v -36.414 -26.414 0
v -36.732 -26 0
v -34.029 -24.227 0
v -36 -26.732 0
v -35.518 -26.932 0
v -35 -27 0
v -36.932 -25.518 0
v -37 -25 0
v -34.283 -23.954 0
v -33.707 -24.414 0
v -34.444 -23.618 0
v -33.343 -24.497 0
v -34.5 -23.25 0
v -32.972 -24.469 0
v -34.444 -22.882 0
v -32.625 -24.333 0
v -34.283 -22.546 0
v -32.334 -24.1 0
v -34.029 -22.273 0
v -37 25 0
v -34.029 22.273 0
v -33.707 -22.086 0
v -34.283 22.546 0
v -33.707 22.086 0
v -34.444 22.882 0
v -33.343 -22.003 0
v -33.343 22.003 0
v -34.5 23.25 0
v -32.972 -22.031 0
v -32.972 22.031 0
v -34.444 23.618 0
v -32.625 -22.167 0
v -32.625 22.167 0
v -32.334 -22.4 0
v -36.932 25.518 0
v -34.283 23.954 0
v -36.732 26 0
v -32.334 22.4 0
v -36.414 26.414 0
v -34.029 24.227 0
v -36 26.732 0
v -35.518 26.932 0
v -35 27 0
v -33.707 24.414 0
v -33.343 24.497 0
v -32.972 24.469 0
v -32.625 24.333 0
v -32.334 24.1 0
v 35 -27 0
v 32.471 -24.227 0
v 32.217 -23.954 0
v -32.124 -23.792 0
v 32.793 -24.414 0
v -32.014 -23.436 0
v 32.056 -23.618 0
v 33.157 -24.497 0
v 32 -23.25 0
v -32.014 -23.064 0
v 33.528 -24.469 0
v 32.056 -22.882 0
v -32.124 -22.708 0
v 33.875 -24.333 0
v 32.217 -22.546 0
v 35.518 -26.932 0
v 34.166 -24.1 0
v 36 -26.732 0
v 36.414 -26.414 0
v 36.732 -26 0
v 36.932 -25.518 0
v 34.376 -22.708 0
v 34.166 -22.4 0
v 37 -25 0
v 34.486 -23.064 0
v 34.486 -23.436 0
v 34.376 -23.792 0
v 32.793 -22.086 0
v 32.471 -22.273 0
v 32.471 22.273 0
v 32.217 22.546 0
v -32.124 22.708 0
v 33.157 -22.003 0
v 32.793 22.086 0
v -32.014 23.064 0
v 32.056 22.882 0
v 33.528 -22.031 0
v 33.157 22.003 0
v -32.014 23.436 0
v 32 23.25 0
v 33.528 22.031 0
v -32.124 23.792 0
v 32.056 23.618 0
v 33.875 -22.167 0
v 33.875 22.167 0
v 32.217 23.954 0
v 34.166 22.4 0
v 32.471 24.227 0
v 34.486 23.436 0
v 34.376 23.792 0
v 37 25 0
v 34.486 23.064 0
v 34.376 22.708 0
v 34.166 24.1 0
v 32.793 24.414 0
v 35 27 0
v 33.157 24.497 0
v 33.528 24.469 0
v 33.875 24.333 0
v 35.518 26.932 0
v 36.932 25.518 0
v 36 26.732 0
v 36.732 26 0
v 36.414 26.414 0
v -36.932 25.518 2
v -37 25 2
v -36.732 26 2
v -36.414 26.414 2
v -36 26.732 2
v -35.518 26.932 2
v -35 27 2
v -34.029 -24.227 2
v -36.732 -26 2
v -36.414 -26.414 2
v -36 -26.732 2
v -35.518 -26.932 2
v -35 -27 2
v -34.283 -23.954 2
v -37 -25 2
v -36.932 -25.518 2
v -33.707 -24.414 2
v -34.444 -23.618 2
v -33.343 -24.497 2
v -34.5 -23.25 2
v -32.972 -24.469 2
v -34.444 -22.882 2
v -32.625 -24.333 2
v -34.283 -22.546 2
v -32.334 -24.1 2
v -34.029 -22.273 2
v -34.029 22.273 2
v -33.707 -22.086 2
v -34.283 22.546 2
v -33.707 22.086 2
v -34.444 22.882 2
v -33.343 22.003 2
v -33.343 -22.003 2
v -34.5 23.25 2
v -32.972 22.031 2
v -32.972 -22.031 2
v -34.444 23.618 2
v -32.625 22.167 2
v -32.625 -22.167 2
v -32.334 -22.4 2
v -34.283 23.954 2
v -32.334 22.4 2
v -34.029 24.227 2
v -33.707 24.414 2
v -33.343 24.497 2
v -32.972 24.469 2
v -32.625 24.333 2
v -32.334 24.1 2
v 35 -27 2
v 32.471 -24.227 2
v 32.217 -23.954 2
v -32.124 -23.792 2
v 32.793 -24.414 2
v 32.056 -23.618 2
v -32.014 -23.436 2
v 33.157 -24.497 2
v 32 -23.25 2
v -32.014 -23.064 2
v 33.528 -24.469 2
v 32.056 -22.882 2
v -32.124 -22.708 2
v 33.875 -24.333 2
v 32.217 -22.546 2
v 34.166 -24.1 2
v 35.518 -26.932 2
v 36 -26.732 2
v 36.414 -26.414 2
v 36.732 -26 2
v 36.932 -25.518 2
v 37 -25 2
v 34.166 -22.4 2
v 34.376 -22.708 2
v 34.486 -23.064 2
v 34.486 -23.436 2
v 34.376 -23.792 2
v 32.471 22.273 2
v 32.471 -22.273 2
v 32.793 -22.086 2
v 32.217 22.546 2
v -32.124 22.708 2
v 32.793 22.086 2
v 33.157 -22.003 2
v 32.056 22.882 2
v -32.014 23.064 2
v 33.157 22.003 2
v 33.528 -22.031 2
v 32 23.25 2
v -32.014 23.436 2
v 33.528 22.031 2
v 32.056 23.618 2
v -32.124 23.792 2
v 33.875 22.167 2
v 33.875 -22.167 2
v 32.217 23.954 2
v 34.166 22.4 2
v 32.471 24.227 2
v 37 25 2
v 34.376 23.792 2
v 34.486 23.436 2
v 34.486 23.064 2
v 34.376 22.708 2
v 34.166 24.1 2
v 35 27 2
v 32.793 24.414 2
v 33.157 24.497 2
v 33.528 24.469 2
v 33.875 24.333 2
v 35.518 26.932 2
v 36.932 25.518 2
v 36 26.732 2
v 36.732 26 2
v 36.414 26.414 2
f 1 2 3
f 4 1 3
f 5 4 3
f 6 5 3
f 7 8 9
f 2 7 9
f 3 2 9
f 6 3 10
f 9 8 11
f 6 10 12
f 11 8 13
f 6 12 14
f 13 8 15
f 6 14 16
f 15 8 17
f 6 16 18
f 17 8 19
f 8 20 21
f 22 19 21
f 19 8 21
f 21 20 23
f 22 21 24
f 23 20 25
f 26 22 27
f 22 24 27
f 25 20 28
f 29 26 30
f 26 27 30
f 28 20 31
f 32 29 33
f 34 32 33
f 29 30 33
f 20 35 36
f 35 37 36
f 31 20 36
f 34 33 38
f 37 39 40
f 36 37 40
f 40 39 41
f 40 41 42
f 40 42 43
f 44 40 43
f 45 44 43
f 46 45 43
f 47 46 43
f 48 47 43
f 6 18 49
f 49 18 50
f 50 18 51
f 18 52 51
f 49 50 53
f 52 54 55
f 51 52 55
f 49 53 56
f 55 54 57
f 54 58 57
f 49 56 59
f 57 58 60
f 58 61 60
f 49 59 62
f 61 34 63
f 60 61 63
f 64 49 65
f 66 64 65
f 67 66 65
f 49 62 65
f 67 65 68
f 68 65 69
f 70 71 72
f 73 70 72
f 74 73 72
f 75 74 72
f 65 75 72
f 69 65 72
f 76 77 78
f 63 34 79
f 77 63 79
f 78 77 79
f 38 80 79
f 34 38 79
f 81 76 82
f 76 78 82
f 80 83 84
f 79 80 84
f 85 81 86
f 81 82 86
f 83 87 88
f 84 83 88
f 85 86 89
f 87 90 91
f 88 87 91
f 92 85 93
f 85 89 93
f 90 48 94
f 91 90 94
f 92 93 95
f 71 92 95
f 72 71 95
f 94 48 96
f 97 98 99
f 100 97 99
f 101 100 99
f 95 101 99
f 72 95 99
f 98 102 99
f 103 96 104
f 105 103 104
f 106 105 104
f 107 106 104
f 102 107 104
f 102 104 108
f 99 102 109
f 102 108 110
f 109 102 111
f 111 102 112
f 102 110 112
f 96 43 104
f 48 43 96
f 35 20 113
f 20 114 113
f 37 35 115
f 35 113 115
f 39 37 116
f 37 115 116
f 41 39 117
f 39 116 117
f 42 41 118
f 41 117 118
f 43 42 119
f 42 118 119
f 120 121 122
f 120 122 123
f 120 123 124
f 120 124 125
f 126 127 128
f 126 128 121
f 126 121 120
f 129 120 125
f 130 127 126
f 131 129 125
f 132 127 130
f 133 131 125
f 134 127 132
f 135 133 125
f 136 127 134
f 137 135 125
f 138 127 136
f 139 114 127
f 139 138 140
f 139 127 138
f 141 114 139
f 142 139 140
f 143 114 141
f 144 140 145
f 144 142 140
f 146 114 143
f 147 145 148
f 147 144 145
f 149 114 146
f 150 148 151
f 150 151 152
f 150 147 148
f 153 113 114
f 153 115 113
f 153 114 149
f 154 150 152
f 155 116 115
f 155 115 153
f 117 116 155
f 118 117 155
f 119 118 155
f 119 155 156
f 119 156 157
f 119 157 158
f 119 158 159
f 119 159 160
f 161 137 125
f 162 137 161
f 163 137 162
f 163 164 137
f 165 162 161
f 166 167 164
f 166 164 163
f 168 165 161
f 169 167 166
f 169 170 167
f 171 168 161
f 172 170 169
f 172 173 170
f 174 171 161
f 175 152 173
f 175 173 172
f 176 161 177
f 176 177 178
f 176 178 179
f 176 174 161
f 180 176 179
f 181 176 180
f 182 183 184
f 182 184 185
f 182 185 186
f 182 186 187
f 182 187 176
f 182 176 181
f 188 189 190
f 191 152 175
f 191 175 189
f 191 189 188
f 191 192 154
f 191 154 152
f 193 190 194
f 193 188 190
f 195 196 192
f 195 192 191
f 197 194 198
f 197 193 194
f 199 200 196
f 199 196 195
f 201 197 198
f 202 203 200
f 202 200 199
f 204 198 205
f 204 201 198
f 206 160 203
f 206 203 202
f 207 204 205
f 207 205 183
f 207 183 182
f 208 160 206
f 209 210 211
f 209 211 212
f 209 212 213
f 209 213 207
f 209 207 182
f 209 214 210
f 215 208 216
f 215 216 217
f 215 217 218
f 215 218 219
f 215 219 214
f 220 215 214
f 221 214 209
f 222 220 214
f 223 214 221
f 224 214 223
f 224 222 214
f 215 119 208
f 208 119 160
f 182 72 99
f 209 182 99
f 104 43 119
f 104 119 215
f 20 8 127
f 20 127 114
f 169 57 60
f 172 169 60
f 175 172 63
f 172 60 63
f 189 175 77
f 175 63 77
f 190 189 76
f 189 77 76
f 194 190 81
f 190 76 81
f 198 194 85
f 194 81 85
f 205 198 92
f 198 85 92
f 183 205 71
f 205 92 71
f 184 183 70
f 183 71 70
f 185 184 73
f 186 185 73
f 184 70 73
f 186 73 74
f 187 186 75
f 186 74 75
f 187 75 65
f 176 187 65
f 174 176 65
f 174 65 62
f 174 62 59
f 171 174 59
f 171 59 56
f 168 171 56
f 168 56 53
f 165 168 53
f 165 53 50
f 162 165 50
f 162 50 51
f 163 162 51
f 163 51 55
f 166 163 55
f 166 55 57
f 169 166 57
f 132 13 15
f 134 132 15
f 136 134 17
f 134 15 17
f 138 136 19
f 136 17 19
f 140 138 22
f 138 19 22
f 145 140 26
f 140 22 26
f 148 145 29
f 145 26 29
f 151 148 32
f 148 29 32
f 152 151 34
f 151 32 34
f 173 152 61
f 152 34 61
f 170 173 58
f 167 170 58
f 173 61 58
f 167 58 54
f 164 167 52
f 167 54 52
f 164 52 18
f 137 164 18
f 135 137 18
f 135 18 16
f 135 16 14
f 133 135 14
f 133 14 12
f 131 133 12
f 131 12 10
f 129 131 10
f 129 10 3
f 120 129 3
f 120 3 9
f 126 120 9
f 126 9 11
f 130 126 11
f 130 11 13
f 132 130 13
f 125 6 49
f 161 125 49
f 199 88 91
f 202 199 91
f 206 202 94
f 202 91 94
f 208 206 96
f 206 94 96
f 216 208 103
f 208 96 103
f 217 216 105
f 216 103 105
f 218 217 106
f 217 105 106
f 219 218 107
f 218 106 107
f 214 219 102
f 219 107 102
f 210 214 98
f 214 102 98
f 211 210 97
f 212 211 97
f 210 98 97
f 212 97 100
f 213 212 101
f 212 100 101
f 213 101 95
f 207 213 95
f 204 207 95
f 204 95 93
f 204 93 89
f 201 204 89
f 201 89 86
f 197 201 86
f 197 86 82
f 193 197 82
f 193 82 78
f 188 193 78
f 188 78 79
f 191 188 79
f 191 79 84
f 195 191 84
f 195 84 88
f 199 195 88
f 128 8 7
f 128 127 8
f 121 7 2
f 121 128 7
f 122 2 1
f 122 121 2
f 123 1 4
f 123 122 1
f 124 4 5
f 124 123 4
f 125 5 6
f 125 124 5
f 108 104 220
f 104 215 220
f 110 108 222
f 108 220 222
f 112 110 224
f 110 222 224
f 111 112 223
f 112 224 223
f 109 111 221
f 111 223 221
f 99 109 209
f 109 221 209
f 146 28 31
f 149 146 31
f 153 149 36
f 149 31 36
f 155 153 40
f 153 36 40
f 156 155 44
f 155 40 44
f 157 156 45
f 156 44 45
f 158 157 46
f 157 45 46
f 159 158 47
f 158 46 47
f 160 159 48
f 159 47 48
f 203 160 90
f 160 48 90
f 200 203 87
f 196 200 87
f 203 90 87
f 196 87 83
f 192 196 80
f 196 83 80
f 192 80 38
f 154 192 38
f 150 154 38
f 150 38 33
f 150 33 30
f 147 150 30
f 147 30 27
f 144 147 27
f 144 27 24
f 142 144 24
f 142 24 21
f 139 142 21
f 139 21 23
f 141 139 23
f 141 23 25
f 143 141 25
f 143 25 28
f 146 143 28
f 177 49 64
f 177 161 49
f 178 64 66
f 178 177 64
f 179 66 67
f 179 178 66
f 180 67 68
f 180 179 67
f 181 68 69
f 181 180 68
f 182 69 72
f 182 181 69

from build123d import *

# Parameters (mm, degrees)
SKETCH3_W           = 74
SKETCH3_H           = 54
BOSS_EXTRUDE1_DEPTH = 2
CUT_EXTRUDE2_REACH  = 47.848
SKETCH4_R           = 1.25
FILLET1_R           = 2


with BuildPart() as part:
    # Sketch3 → Boss-Extrude1 (new body)
    with BuildSketch(Plane.XY):
        Rectangle(SKETCH3_W, SKETCH3_H)
    extrude(amount=BOSS_EXTRUDE1_DEPTH)

    # Sketch4 → Cut-Extrude2 (cut, up to next)
    with BuildSketch(Plane(origin=(0, 0, 0), x_dir=(-1, 0, 0), z_dir=(0, 0, -1)), mode=Mode.PRIVATE) as cut_extrude2_sk1:
        with Locations((-33.25, 23.25)):
            Circle(SKETCH4_R)
    cut_extrude2_tool1 = extrude(cut_extrude2_sk1.sketch, amount=-CUT_EXTRUDE2_REACH, mode=Mode.PRIVATE) & part.part
    # Sketch4 → Cut-Extrude2 (cut, up to next)
    with BuildSketch(Plane(origin=(0, 0, 0), x_dir=(-1, 0, 0), z_dir=(0, 0, -1)), mode=Mode.PRIVATE) as cut_extrude2_sk2:
        with Locations((33.25, 23.25)):
            Circle(SKETCH4_R)
    cut_extrude2_tool2 = extrude(cut_extrude2_sk2.sketch, amount=-CUT_EXTRUDE2_REACH, mode=Mode.PRIVATE) & part.part
    # Sketch4 → Cut-Extrude2 (cut, up to next)
    with BuildSketch(Plane(origin=(0, 0, 0), x_dir=(-1, 0, 0), z_dir=(0, 0, -1)), mode=Mode.PRIVATE) as cut_extrude2_sk3:
        with Locations((33.25, -23.25)):
            Circle(SKETCH4_R)
    cut_extrude2_tool3 = extrude(cut_extrude2_sk3.sketch, amount=-CUT_EXTRUDE2_REACH, mode=Mode.PRIVATE) & part.part
    # Sketch4 → Cut-Extrude2 (cut, up to next)
    with BuildSketch(Plane(origin=(0, 0, 0), x_dir=(-1, 0, 0), z_dir=(0, 0, -1)), mode=Mode.PRIVATE) as cut_extrude2_sk4:
        with Locations((-33.25, -23.25)):
            Circle(SKETCH4_R)
    cut_extrude2_tool4 = extrude(cut_extrude2_sk4.sketch, amount=-CUT_EXTRUDE2_REACH, mode=Mode.PRIVATE) & part.part
    add(cut_extrude2_tool1.solids().sort_by_distance((33.25, 23.25, 0))[0], mode=Mode.SUBTRACT)
    add(cut_extrude2_tool2.solids().sort_by_distance((-33.25, 23.25, 0))[0], mode=Mode.SUBTRACT)
    add(cut_extrude2_tool3.solids().sort_by_distance((-33.25, -23.25, 0))[0], mode=Mode.SUBTRACT)
    add(cut_extrude2_tool4.solids().sort_by_distance((33.25, -23.25, 0))[0], mode=Mode.SUBTRACT)

    # Fillet1
    fillet1_edges = [part.edges().sort_by_distance(p)[0] for p in [
        (-37, 27, 1),
        (37, 27, 1),
        (37, -27, 1),
        (-37, -27, 1),
    ]]
    fillet(fillet1_edges, radius=FILLET1_R)


solid = part.part
